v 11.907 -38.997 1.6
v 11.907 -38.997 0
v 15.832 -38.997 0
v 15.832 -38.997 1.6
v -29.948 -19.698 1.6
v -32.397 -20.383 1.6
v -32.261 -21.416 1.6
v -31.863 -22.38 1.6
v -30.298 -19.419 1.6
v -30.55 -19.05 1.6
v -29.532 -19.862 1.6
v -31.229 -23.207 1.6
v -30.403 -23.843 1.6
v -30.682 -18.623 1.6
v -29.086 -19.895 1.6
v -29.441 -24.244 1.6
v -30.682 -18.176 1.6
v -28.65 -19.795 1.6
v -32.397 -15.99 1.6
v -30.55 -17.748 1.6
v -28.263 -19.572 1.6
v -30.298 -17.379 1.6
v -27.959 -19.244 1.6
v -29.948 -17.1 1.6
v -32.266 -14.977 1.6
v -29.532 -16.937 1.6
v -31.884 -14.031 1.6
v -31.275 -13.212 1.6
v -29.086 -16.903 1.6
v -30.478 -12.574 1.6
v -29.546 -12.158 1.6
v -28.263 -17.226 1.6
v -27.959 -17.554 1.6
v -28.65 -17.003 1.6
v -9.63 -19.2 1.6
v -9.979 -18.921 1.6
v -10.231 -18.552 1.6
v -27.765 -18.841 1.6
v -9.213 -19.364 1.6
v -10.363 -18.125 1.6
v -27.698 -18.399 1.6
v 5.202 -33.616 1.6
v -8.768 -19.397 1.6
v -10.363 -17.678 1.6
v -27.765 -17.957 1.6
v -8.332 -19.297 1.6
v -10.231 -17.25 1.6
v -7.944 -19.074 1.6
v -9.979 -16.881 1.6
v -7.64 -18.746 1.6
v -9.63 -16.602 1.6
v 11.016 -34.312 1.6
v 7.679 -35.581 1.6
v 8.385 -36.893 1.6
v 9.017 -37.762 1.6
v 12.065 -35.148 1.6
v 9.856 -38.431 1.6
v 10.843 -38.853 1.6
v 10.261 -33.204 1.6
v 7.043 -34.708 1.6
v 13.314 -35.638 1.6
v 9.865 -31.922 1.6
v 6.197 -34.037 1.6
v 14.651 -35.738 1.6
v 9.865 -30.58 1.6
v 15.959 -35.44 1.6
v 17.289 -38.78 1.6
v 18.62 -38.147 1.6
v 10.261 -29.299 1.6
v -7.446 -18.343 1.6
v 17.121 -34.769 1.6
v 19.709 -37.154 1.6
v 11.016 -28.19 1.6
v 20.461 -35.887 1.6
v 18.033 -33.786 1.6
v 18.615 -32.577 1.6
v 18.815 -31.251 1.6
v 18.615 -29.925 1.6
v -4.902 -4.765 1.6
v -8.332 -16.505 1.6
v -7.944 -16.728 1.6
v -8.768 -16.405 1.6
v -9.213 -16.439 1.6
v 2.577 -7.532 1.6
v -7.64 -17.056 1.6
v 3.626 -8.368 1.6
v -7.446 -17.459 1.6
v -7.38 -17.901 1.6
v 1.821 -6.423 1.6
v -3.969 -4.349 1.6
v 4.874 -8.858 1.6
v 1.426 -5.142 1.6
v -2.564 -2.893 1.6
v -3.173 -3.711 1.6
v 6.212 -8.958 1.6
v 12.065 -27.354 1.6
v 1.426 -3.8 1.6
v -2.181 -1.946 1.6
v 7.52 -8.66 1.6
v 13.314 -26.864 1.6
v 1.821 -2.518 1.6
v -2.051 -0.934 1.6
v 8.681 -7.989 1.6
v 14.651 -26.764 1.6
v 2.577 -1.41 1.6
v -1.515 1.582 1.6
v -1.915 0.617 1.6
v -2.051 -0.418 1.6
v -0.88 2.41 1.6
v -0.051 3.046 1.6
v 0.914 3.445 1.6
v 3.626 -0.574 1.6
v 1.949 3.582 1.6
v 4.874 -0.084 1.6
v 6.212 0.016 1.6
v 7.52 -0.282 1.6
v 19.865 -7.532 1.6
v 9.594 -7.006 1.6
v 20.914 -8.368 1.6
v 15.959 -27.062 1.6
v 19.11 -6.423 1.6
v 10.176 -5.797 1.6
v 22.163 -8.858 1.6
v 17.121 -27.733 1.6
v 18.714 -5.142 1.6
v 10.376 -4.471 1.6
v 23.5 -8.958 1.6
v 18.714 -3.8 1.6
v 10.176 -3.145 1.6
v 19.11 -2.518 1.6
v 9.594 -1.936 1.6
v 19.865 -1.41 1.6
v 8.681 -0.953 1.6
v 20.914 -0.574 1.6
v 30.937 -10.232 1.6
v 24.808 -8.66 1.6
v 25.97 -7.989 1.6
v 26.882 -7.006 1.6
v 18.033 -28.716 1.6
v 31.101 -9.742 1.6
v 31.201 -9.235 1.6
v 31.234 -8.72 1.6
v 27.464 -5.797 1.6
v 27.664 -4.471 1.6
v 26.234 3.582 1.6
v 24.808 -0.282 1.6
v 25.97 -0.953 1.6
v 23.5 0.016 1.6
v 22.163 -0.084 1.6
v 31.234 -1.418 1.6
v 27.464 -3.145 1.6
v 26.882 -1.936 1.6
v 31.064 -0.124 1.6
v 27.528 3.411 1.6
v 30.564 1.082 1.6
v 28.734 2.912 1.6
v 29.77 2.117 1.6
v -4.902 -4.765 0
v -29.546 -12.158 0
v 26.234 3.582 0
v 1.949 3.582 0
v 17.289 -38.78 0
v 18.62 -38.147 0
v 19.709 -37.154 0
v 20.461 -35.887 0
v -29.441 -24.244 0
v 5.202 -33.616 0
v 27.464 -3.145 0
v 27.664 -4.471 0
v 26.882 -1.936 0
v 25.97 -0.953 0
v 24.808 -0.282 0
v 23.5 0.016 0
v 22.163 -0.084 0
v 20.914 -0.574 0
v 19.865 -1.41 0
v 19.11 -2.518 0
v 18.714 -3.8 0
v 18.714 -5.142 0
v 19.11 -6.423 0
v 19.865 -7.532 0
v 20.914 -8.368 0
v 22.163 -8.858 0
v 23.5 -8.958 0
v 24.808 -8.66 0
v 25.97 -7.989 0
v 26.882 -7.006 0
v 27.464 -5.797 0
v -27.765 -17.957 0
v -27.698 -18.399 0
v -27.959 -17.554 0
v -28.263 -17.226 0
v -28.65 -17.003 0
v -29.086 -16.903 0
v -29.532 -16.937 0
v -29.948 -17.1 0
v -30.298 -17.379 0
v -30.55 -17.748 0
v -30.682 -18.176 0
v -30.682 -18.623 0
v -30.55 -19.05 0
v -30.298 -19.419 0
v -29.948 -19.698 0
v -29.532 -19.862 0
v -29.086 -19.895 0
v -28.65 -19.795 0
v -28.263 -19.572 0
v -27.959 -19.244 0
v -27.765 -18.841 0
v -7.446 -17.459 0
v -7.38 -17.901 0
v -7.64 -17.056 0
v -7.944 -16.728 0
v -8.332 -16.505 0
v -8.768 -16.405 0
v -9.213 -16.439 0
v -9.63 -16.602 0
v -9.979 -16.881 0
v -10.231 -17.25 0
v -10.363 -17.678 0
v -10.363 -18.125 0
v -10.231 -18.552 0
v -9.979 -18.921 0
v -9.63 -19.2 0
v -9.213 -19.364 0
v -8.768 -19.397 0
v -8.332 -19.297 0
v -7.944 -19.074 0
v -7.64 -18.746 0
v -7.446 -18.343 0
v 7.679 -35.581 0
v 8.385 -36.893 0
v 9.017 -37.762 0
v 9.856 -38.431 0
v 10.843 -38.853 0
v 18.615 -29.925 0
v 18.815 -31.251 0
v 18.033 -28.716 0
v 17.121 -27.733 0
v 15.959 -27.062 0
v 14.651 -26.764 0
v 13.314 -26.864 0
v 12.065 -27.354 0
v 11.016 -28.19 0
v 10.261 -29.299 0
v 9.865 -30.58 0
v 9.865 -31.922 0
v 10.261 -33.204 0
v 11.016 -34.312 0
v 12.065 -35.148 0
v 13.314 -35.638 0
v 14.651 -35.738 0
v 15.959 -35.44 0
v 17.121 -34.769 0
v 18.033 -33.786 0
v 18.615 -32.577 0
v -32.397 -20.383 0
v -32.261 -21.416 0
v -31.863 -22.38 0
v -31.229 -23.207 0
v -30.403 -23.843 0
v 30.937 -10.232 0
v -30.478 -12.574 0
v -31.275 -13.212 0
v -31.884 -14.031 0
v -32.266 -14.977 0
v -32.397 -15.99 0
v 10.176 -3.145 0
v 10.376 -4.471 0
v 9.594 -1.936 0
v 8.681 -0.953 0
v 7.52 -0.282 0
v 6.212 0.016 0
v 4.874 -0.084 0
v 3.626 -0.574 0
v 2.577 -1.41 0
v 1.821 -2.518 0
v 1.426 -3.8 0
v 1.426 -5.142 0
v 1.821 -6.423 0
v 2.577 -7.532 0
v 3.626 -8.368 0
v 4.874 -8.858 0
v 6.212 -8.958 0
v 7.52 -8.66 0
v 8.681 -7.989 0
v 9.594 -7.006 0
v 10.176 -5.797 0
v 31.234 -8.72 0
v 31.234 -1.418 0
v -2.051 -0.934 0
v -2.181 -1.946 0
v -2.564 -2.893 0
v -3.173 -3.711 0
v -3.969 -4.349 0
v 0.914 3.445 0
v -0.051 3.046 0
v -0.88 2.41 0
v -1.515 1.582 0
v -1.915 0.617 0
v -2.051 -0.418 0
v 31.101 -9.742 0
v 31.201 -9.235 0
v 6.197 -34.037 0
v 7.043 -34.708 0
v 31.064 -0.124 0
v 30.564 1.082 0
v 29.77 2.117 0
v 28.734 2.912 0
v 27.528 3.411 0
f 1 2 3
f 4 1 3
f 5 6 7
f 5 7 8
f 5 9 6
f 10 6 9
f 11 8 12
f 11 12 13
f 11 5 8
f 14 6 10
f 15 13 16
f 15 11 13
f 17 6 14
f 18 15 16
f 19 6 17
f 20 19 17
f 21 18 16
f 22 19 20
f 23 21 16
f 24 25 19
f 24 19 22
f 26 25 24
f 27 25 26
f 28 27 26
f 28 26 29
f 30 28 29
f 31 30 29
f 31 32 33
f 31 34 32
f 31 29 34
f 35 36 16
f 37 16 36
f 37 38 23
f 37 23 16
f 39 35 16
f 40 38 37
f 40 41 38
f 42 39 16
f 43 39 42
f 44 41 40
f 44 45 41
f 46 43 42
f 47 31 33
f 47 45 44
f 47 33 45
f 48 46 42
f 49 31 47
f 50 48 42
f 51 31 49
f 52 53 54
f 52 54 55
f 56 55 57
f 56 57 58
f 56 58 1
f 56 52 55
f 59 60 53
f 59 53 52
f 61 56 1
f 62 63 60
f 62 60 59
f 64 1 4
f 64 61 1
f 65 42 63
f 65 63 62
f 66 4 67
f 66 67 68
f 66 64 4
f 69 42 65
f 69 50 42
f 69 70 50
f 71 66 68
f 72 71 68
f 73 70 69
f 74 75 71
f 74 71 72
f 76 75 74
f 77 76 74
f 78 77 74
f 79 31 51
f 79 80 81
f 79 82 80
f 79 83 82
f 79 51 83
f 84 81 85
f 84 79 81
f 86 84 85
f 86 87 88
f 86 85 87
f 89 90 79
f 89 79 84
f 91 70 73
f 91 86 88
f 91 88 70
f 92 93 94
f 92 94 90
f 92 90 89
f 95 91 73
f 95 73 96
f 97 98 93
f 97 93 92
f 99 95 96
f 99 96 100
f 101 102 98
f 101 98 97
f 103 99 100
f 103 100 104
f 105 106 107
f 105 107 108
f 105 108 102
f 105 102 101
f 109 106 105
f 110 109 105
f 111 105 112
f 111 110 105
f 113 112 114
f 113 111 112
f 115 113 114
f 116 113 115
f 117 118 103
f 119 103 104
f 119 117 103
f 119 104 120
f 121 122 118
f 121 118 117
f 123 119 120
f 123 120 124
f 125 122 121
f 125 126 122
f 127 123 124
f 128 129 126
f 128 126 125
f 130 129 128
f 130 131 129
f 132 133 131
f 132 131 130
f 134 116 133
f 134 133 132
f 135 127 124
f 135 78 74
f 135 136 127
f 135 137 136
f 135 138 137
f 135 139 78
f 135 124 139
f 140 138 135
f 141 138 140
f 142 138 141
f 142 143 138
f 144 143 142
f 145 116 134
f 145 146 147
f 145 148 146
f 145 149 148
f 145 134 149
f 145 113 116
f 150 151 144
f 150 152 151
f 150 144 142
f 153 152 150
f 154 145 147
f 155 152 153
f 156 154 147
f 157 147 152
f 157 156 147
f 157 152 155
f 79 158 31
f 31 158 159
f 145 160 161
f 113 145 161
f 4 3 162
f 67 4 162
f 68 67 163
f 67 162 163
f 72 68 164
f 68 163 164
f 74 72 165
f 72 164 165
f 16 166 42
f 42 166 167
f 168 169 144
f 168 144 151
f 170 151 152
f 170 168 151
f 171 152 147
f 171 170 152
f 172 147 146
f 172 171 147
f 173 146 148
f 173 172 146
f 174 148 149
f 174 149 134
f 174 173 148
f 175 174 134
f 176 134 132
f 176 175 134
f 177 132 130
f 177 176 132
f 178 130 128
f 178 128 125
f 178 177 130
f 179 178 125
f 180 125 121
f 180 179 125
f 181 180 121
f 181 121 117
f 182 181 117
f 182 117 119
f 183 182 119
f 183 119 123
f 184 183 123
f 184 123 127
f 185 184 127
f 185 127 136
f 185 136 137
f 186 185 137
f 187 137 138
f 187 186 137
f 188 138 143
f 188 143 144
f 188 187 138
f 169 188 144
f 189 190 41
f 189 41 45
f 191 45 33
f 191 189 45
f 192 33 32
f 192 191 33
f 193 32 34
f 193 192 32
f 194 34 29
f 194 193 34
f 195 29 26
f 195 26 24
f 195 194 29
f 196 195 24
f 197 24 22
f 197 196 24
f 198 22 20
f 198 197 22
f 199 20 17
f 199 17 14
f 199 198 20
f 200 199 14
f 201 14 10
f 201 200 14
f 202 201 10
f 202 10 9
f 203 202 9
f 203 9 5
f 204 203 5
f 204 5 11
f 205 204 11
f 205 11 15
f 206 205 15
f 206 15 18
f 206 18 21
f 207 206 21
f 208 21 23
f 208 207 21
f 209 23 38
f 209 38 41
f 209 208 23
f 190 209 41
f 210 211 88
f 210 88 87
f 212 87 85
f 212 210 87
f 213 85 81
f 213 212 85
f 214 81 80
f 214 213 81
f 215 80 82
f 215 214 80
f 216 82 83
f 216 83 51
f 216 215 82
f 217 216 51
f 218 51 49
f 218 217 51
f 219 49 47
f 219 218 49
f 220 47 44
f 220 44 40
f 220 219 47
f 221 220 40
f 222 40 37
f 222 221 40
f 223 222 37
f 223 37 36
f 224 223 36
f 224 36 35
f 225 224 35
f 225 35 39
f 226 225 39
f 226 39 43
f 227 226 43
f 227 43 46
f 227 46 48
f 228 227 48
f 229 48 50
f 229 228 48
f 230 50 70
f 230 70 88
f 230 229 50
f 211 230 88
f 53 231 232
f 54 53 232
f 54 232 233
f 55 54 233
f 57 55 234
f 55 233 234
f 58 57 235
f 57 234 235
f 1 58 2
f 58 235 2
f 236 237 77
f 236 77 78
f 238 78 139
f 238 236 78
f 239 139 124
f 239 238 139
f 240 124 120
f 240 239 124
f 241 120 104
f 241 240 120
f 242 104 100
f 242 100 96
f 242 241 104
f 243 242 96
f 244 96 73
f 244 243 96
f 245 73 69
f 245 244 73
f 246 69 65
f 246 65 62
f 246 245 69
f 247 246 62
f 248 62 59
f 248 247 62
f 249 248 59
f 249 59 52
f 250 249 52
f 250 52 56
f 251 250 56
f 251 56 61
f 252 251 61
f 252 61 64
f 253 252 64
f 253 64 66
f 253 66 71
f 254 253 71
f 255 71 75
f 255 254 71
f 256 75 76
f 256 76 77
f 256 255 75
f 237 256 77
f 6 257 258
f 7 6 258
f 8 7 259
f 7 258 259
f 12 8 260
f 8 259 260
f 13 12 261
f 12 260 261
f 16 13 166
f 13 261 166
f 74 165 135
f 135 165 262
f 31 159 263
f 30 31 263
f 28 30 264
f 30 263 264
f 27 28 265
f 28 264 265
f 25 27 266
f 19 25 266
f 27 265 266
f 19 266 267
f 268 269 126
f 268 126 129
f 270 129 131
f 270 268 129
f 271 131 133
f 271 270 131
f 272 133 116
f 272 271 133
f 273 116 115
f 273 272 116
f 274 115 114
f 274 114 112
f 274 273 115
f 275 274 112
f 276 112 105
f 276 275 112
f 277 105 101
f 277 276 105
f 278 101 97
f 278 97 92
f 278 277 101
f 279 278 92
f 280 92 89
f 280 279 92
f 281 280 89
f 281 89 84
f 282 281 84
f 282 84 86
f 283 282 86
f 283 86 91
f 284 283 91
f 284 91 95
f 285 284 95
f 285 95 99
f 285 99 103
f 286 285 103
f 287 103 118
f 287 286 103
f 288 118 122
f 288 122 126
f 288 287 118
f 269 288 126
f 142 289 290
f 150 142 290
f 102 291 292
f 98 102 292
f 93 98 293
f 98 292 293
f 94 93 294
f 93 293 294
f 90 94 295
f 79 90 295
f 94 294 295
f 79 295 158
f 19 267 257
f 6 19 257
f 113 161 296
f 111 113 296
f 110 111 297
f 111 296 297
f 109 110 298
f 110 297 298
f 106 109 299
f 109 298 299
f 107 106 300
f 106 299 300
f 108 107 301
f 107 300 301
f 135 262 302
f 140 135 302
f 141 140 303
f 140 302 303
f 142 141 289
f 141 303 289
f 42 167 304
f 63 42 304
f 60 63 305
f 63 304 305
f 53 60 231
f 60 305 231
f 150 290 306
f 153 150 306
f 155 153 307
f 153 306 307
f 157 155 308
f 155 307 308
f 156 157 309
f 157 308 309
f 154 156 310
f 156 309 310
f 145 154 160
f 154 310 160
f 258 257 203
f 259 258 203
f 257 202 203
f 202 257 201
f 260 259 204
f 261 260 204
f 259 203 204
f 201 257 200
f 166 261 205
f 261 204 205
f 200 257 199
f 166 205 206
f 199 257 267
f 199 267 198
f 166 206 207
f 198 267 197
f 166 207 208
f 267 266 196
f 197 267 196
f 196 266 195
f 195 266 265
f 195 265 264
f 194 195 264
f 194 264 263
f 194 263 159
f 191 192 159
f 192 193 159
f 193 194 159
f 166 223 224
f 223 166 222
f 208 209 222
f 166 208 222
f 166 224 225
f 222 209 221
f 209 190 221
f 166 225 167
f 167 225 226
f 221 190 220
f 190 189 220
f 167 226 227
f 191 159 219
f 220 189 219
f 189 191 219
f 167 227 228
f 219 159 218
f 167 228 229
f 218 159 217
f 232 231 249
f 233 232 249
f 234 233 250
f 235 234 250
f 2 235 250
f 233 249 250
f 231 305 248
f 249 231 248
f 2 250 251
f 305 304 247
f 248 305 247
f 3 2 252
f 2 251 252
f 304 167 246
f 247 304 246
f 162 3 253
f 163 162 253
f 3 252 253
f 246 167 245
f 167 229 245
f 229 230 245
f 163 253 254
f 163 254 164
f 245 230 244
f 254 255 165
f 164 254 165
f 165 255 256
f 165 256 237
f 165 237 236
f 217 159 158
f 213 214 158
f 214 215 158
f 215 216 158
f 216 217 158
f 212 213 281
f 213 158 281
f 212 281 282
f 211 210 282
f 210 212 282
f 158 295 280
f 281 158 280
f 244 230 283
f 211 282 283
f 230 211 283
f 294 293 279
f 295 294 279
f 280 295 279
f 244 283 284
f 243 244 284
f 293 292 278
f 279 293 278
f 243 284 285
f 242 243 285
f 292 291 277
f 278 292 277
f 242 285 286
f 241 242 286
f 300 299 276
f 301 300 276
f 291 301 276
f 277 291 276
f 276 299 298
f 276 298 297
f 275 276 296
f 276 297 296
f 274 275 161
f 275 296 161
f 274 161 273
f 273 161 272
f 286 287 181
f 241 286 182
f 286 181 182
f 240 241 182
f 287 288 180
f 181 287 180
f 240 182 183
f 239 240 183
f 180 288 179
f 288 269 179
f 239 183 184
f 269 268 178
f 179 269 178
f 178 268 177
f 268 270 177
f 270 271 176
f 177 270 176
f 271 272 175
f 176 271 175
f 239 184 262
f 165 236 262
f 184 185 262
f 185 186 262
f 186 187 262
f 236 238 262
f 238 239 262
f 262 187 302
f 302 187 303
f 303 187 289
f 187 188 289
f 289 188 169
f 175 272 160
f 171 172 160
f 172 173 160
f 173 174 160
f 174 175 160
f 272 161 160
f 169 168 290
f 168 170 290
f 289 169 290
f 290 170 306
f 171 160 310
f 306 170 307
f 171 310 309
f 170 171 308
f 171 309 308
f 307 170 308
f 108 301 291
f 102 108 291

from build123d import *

# Parameters (mm, degrees)
F0_R     = 1.5
F0_R_2   = 4.5
F1_DEPTH = 1.6


with BuildPart() as f1:
    # F0 (on Top) → F1 (new body)
    with BuildSketch(Plane.XY):
        with BuildLine():
            Line((31.234043, -8.719558), (31.234043, -1.418333))
            ThreePointArc((31.234043, -1.418333), (29.769577, 2.117201), (26.234043, 3.581667))
            Line((26.234043, 3.581667), (1.948889, 3.581667))
            ThreePointArc((1.948889, 3.581667), (-0.879538, 2.410094), (-2.051111, -0.418333))
            Line((-2.051111, -0.418333), (-2.051111, -0.933739))
            ThreePointArc((-2.051111, -0.933739), (-2.84194, -3.321461), (-4.90172, -4.765044))
            Line((-4.90172, -4.765044), (-29.545943, -12.158312))
            ThreePointArc((-29.545943, -12.158312), (-31.605723, -13.601895), (-32.396551, -15.989617))
            Line((-32.396551, -15.989617), (-32.396551, -20.383074))
            ThreePointArc((-32.396551, -20.383074), (-31.572894, -22.814297), (-29.441127, -24.244273))
            Line((-29.441127, -24.244273), (5.201511, -33.616194))
            ThreePointArc((5.201511, -33.616194), (6.642545, -34.343427), (7.678821, -35.580996))
            Line((7.678821, -35.580996), (8.385379, -36.893176))
            ThreePointArc((8.385379, -36.893176), (9.856117, -38.430843), (11.907264, -38.996778))
            Line((11.907264, -38.996778), (15.831667, -38.996778))
            ThreePointArc((15.831667, -38.996778), (18.619917, -38.14716), (20.460587, -35.887045))
            Line((20.460587, -35.887045), (30.937178, -10.231771))
            ThreePointArc((30.937178, -10.231771), (31.159125, -9.490096), (31.234043, -8.719558))
        make_face()
        with Locations((-29.198352, -18.399177)):
            Circle(F0_R, mode=Mode.SUBTRACT)
        with Locations((-8.879622, -17.901169)):
            Circle(F0_R, mode=Mode.SUBTRACT)
        with Locations((14.315047, -31.251039)):
            Circle(F0_R_2, mode=Mode.SUBTRACT)
        with Locations((5.875676, -4.47092)):
            Circle(F0_R_2, mode=Mode.SUBTRACT)
        with Locations((23.163911, -4.47092)):
            Circle(F0_R_2, mode=Mode.SUBTRACT)
    extrude(amount=F1_DEPTH)


solid = f1.part
